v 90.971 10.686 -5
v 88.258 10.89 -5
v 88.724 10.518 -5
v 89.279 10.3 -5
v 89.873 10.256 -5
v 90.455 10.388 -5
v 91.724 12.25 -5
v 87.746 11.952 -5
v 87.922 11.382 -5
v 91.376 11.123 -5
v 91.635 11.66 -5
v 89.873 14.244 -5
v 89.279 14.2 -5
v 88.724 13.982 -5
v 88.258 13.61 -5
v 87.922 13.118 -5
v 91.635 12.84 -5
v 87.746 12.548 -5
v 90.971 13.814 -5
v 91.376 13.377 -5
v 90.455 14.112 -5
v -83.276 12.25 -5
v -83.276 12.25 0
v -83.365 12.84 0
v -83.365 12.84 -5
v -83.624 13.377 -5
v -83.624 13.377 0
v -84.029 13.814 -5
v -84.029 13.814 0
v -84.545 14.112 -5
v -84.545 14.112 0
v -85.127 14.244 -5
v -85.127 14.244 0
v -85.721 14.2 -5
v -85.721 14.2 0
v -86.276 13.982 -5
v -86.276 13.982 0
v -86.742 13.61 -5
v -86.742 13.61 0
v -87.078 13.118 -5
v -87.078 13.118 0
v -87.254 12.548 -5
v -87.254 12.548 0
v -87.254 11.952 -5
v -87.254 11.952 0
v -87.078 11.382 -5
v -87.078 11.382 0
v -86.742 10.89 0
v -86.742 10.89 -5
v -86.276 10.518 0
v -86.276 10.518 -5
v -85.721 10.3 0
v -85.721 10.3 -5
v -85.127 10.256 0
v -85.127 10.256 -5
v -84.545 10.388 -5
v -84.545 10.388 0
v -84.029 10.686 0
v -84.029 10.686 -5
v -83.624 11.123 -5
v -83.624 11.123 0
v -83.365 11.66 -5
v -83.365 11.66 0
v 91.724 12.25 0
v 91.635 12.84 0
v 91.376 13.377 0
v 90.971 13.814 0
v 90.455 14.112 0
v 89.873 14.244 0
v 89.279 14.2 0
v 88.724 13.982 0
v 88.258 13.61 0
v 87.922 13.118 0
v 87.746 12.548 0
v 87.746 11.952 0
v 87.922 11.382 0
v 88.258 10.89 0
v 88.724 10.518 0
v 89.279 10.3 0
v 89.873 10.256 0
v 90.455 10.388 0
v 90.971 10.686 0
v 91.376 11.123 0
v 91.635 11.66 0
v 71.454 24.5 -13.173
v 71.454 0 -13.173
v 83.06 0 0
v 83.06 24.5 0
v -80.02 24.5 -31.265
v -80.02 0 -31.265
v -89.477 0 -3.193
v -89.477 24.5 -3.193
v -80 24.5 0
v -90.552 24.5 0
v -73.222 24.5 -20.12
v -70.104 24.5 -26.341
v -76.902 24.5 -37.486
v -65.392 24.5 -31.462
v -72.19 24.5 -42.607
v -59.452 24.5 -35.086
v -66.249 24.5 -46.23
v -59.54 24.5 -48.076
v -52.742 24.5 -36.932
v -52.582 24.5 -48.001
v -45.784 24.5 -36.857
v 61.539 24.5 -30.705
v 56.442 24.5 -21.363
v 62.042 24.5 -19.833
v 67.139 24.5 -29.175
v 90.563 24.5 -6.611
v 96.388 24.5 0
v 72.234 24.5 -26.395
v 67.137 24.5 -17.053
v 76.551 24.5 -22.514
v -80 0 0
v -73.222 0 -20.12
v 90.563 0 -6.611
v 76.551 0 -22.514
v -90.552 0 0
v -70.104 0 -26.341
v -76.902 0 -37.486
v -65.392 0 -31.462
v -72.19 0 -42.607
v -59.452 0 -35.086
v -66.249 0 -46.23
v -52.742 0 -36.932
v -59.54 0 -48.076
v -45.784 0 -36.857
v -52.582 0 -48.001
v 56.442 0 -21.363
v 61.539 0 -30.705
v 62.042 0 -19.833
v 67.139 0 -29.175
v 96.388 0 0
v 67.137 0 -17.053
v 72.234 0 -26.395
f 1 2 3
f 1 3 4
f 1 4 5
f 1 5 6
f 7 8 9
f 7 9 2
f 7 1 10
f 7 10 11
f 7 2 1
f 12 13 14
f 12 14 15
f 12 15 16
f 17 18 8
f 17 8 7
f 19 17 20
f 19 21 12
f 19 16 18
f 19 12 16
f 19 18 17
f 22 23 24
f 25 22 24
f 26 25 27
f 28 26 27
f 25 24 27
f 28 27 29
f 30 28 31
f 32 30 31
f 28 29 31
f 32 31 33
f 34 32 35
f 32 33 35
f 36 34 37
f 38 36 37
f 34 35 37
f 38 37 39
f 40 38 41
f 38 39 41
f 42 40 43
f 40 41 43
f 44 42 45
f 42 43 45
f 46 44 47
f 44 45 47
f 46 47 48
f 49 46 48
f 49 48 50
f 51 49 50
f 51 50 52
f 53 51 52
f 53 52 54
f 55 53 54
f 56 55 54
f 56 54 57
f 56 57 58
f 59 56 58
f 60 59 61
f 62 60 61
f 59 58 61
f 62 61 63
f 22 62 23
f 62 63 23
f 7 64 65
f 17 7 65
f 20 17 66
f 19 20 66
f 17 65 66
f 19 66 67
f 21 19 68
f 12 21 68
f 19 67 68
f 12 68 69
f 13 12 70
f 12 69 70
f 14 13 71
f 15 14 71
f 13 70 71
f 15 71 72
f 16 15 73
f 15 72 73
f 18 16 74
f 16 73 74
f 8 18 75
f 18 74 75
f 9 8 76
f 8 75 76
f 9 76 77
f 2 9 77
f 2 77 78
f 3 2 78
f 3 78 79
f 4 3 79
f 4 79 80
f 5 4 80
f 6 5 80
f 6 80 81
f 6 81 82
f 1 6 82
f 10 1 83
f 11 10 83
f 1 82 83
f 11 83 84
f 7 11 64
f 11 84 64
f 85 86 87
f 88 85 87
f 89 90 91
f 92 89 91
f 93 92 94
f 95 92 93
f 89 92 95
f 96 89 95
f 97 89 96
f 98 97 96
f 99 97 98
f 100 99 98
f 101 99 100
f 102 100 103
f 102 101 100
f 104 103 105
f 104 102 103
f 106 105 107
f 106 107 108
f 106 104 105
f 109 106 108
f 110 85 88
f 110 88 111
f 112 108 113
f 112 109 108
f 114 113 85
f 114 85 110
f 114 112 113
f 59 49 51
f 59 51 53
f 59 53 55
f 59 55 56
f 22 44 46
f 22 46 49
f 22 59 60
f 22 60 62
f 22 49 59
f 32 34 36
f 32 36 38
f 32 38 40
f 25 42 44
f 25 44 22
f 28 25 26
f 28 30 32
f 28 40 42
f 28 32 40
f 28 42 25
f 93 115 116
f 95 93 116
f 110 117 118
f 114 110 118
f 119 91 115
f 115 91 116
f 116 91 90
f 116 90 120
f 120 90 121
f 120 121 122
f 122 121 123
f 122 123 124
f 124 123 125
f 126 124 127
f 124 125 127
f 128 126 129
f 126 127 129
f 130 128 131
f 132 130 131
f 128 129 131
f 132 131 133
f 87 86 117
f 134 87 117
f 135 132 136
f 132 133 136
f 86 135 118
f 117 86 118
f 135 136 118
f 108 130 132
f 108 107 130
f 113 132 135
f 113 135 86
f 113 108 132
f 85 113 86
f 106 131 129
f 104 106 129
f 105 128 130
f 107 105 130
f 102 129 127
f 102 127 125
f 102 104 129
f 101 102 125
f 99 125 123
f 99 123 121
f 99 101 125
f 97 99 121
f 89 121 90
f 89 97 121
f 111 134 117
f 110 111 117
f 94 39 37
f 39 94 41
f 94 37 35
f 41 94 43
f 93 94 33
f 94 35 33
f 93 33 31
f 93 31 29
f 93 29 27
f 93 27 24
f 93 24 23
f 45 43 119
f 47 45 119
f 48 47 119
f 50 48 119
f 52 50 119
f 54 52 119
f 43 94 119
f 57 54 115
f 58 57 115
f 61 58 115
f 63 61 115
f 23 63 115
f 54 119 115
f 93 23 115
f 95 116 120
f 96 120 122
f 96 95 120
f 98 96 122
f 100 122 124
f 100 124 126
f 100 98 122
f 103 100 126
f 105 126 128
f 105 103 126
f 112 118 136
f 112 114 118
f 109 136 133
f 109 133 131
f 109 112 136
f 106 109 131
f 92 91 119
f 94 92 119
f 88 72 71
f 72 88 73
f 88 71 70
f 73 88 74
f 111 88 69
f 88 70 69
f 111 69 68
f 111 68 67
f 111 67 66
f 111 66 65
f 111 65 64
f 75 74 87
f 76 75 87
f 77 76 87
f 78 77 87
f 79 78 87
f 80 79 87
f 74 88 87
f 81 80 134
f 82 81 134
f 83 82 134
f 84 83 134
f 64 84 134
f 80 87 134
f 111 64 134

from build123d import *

# Parameters (mm, degrees)
EXTRUDE_1_DEPTH     = 24.5
FILLET_1_R          = 25
SKETCH_2_R          = 2
CUT_EXTRUDE_1_DEPTH = 5


with BuildPart() as part:
    # 草图1 → 凸台-拉伸1 (new body)
    with BuildSketch(Plane(origin=(0, 0, 0), x_dir=(1, 0, 0), z_dir=(0, 1, 0))):
        Polygon((-80, 0), (-66.524518745, 40), (65.438851804, 20), (83.060057617, 0), (96.387725214, 0), (90.563245948, 6.610761292), (70.535919799, 29.341698507), (-73.32231493, 51.144450912), (-89.476681383, 3.192571058), (-90.552217169, 0), align=None)
    extrude(amount=EXTRUDE_1_DEPTH)

    # 圆角1
    fillet_1_edges = [part.edges().sort_by_distance(p)[0] for p in [
        (-73.32231493, 12.25, -51.144450912),
        (70.535919799, 12.25, -29.341698507),
        (65.438851804, 12.25, -20),
        (-66.524518745, 12.25, -40),
    ]]
    fillet(fillet_1_edges, radius=FILLET_1_R)

    # 草图2 → 切除-拉伸1 (cut)
    with BuildSketch(Plane.XY):
        with Locations((-85.276108585, 12.25)):
            Circle(SKETCH_2_R)
        with Locations((89.723891415, 12.25)):
            Circle(SKETCH_2_R)
    extrude(amount=-CUT_EXTRUDE_1_DEPTH, mode=Mode.SUBTRACT)


solid = part.part
